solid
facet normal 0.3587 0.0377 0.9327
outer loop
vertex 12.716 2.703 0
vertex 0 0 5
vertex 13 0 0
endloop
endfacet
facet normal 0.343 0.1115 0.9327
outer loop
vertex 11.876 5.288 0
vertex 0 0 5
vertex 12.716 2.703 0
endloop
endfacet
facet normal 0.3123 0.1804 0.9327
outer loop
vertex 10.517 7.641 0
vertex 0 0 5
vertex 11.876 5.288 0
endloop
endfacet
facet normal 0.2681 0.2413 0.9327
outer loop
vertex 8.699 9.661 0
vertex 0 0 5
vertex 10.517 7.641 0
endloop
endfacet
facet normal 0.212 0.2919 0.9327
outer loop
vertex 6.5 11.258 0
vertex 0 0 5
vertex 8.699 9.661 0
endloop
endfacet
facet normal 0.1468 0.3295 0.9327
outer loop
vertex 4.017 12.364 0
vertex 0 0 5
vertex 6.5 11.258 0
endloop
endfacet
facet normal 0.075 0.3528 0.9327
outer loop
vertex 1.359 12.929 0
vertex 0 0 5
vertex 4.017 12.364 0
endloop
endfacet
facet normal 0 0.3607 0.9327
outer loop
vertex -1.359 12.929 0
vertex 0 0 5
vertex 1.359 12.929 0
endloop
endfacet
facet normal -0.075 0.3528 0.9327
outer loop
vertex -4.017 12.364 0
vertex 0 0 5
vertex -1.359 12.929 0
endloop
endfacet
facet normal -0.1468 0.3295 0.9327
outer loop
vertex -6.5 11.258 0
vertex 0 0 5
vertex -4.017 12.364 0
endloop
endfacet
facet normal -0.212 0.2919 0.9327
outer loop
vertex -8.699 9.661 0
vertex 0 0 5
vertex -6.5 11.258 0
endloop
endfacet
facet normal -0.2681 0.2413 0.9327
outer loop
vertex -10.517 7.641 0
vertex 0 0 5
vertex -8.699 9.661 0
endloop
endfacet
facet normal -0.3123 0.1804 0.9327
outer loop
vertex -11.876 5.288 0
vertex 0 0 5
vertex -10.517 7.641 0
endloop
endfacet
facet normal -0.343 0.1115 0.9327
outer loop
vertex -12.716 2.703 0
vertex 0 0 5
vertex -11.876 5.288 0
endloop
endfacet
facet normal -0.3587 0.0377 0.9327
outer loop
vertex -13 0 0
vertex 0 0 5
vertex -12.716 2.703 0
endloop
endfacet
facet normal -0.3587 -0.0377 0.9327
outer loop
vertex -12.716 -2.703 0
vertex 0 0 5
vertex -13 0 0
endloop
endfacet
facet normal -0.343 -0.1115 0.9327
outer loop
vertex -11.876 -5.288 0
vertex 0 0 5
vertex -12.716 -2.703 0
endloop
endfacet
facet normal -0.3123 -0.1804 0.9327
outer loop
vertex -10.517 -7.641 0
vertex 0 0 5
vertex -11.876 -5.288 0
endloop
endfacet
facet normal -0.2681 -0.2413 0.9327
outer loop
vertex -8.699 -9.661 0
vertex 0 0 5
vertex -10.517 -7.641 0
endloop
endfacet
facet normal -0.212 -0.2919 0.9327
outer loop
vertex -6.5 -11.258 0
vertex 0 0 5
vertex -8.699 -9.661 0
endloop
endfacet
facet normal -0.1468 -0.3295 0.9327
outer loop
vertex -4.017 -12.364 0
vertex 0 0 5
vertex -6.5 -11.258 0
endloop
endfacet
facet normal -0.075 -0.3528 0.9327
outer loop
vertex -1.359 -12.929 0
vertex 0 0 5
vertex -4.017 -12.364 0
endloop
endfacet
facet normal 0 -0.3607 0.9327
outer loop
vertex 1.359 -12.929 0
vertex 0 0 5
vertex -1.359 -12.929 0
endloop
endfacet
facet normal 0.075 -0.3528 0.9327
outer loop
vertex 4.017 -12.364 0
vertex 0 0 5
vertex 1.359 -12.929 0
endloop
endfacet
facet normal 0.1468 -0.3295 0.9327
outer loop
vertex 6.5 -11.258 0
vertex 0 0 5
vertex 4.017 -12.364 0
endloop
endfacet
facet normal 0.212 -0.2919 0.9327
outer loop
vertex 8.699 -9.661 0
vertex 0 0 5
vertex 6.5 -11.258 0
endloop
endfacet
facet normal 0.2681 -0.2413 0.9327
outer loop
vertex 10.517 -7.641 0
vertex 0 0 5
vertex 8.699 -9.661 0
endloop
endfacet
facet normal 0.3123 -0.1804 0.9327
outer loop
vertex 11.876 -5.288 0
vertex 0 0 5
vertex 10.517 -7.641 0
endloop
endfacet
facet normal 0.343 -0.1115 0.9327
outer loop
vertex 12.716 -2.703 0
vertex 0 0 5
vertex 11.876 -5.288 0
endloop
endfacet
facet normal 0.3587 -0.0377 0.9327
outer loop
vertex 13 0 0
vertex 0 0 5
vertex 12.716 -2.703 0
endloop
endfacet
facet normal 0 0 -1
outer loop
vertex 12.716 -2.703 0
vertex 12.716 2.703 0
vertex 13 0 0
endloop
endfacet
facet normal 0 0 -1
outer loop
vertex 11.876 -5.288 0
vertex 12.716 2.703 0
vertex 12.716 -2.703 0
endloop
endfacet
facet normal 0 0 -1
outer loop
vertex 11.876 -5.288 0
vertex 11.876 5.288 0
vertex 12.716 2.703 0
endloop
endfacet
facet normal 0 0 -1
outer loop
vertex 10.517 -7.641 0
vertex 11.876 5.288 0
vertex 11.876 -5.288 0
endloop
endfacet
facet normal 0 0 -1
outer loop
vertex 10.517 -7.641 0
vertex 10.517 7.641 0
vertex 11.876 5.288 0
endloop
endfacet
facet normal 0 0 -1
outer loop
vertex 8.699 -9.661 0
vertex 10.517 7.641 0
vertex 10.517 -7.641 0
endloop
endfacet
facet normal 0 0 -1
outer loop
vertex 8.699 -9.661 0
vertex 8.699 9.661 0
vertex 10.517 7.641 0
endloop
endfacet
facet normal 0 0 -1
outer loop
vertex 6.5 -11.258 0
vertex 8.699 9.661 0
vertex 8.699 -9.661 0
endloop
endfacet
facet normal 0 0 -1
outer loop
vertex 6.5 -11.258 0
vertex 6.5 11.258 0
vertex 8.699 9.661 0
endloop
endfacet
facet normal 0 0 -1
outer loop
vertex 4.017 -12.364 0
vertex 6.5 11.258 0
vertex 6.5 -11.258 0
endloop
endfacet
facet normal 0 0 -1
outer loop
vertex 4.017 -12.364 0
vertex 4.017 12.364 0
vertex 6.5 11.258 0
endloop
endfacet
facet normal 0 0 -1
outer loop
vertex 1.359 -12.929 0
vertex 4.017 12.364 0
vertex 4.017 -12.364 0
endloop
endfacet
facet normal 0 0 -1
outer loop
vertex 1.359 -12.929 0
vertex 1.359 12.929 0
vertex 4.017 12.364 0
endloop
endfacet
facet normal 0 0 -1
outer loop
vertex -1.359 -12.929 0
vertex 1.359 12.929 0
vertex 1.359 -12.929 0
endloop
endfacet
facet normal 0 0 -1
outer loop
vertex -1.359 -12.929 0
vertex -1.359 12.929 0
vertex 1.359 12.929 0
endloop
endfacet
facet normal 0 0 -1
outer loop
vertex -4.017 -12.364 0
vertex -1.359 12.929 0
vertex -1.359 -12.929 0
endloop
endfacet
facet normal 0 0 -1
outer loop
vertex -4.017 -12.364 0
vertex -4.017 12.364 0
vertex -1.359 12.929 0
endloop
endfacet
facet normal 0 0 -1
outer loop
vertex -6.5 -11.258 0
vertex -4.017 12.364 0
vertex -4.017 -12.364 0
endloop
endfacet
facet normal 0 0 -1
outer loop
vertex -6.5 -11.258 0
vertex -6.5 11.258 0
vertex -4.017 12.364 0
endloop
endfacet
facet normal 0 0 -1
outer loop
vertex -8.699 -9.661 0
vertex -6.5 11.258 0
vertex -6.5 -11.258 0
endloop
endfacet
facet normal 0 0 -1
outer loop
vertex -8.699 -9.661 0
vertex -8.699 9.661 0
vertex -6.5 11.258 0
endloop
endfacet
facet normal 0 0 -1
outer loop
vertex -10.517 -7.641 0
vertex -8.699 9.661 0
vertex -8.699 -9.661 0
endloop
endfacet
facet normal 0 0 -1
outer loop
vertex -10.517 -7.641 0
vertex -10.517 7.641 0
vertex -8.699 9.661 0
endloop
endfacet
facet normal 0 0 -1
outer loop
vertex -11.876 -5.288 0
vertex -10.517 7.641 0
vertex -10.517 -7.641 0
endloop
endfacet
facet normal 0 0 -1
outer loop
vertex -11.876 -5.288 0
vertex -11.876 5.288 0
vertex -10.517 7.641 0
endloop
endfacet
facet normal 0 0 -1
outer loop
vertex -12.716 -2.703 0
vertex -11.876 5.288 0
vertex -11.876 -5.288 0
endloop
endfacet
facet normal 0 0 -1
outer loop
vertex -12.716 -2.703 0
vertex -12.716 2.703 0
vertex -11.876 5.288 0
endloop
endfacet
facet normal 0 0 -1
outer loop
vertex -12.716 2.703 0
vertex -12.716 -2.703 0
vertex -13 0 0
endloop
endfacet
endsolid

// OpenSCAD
// Generated by SolidPython 1.0.1 on 2020-07-29 00:46:43


cylinder(h = 5, r1 = 13, r2 = 0);
/***********************************************
*********      SolidPython code:      **********
************************************************
 
# import packages: SolidPython
from solid import *
from solid.utils import *
from itertools import chain, combinations, permutations


class Resize:

    def __init__(self, scad_file):
        self.scad_file = scad_file
        #self.scad_file = import_scad(scad_file)
        # cone/cylinder param:
        self.r1 = 0
        self.r2 = 0
        self.h = 0
        # rectangular prism param:
        self.w = 0
        self.l = 0
        # ellipse param:
        self.r = 0

    # import OpenScad code (file name corresponds to shape)


    # classify shape + parameters
    def assign(self, param1, param2, param3):
        if self.scad_file == 'cone.scad':
            self.r1 = param1
            self.r2 = param2
            self.h = param3
        elif self.scad_file == 'cylinder.scad':
            self.r1 = param1
            self.r2 = param2
            self.h = param3
        elif self.scad_file == 'rectangularPrism.scad':
            self.h = param1
            self.l = param2
            self.w = param3
        else:
            self.r = param1
            self.h = param2

    # resize parameters
    def iterate(self):
        x = range(3, 20, 2)
        i = 1
        if self.scad_file == 'cone.scad':
            tempList = list(permutations(x, 2))
            for temp in tempList:
                param1 = temp[0]
                param2 = temp[1]
                filepath = 'produced_scad_files/' + 'cone' + str(param1) + '_' + str(param2) + '_' + '.scad'
                scad_render_to_file(cylinder(h=param1, r1=param2, r2=0), filepath)

        elif self.scad_file == 'cylinder.scad':
            tempList = list(permutations(x, 3))
            for temp in tempList:
                param1 = temp[0]
                param2 = temp[1]
                filepath = 'produced_scad_files/' + 'cylinder' + str(param1) + '_' + str(param2) + '_' + '.scad'
                scad_render_to_file(cylinder(h=param1, r1=param2, r2=param2), filepath)

        elif self.scad_file == 'rectangularPrism.scad':
            tempList = list(permutations(x, 3))
            for temp in tempList:
                param1 = temp[0]
                param2 = temp[1]
                param3 = temp[2]
                filepath = 'produced_scad_files/' + 'rectangularPrism' + str(param1) + '_' + str(param2) + '_' + str(
                    param3) + '.scad'
                scad_render_to_file(cube(size=(param1, param2, param3)), filepath)

        elif self.scad_file == 'ellipse.scad':
            tempList = list(permutations(x, 4))
            for temp in tempList:
                param1 = temp[0]
                param2 = temp[1]
                param3 = temp[2]
                param4 = temp[3]
                filepath = 'produced_scad_files/' + 'ellipse' + str(param1) + '_' + str(param2) + '_' + str(param3) + '_' + str(param4) + '.scad'
                scad_render_to_file(scale([param1, param2, param3])(sphere(r=param4)), filepath)

    def render_to_scadfile(self):
        scad_render_to_file(scad, 'example.scad') 
 
************************************************/
